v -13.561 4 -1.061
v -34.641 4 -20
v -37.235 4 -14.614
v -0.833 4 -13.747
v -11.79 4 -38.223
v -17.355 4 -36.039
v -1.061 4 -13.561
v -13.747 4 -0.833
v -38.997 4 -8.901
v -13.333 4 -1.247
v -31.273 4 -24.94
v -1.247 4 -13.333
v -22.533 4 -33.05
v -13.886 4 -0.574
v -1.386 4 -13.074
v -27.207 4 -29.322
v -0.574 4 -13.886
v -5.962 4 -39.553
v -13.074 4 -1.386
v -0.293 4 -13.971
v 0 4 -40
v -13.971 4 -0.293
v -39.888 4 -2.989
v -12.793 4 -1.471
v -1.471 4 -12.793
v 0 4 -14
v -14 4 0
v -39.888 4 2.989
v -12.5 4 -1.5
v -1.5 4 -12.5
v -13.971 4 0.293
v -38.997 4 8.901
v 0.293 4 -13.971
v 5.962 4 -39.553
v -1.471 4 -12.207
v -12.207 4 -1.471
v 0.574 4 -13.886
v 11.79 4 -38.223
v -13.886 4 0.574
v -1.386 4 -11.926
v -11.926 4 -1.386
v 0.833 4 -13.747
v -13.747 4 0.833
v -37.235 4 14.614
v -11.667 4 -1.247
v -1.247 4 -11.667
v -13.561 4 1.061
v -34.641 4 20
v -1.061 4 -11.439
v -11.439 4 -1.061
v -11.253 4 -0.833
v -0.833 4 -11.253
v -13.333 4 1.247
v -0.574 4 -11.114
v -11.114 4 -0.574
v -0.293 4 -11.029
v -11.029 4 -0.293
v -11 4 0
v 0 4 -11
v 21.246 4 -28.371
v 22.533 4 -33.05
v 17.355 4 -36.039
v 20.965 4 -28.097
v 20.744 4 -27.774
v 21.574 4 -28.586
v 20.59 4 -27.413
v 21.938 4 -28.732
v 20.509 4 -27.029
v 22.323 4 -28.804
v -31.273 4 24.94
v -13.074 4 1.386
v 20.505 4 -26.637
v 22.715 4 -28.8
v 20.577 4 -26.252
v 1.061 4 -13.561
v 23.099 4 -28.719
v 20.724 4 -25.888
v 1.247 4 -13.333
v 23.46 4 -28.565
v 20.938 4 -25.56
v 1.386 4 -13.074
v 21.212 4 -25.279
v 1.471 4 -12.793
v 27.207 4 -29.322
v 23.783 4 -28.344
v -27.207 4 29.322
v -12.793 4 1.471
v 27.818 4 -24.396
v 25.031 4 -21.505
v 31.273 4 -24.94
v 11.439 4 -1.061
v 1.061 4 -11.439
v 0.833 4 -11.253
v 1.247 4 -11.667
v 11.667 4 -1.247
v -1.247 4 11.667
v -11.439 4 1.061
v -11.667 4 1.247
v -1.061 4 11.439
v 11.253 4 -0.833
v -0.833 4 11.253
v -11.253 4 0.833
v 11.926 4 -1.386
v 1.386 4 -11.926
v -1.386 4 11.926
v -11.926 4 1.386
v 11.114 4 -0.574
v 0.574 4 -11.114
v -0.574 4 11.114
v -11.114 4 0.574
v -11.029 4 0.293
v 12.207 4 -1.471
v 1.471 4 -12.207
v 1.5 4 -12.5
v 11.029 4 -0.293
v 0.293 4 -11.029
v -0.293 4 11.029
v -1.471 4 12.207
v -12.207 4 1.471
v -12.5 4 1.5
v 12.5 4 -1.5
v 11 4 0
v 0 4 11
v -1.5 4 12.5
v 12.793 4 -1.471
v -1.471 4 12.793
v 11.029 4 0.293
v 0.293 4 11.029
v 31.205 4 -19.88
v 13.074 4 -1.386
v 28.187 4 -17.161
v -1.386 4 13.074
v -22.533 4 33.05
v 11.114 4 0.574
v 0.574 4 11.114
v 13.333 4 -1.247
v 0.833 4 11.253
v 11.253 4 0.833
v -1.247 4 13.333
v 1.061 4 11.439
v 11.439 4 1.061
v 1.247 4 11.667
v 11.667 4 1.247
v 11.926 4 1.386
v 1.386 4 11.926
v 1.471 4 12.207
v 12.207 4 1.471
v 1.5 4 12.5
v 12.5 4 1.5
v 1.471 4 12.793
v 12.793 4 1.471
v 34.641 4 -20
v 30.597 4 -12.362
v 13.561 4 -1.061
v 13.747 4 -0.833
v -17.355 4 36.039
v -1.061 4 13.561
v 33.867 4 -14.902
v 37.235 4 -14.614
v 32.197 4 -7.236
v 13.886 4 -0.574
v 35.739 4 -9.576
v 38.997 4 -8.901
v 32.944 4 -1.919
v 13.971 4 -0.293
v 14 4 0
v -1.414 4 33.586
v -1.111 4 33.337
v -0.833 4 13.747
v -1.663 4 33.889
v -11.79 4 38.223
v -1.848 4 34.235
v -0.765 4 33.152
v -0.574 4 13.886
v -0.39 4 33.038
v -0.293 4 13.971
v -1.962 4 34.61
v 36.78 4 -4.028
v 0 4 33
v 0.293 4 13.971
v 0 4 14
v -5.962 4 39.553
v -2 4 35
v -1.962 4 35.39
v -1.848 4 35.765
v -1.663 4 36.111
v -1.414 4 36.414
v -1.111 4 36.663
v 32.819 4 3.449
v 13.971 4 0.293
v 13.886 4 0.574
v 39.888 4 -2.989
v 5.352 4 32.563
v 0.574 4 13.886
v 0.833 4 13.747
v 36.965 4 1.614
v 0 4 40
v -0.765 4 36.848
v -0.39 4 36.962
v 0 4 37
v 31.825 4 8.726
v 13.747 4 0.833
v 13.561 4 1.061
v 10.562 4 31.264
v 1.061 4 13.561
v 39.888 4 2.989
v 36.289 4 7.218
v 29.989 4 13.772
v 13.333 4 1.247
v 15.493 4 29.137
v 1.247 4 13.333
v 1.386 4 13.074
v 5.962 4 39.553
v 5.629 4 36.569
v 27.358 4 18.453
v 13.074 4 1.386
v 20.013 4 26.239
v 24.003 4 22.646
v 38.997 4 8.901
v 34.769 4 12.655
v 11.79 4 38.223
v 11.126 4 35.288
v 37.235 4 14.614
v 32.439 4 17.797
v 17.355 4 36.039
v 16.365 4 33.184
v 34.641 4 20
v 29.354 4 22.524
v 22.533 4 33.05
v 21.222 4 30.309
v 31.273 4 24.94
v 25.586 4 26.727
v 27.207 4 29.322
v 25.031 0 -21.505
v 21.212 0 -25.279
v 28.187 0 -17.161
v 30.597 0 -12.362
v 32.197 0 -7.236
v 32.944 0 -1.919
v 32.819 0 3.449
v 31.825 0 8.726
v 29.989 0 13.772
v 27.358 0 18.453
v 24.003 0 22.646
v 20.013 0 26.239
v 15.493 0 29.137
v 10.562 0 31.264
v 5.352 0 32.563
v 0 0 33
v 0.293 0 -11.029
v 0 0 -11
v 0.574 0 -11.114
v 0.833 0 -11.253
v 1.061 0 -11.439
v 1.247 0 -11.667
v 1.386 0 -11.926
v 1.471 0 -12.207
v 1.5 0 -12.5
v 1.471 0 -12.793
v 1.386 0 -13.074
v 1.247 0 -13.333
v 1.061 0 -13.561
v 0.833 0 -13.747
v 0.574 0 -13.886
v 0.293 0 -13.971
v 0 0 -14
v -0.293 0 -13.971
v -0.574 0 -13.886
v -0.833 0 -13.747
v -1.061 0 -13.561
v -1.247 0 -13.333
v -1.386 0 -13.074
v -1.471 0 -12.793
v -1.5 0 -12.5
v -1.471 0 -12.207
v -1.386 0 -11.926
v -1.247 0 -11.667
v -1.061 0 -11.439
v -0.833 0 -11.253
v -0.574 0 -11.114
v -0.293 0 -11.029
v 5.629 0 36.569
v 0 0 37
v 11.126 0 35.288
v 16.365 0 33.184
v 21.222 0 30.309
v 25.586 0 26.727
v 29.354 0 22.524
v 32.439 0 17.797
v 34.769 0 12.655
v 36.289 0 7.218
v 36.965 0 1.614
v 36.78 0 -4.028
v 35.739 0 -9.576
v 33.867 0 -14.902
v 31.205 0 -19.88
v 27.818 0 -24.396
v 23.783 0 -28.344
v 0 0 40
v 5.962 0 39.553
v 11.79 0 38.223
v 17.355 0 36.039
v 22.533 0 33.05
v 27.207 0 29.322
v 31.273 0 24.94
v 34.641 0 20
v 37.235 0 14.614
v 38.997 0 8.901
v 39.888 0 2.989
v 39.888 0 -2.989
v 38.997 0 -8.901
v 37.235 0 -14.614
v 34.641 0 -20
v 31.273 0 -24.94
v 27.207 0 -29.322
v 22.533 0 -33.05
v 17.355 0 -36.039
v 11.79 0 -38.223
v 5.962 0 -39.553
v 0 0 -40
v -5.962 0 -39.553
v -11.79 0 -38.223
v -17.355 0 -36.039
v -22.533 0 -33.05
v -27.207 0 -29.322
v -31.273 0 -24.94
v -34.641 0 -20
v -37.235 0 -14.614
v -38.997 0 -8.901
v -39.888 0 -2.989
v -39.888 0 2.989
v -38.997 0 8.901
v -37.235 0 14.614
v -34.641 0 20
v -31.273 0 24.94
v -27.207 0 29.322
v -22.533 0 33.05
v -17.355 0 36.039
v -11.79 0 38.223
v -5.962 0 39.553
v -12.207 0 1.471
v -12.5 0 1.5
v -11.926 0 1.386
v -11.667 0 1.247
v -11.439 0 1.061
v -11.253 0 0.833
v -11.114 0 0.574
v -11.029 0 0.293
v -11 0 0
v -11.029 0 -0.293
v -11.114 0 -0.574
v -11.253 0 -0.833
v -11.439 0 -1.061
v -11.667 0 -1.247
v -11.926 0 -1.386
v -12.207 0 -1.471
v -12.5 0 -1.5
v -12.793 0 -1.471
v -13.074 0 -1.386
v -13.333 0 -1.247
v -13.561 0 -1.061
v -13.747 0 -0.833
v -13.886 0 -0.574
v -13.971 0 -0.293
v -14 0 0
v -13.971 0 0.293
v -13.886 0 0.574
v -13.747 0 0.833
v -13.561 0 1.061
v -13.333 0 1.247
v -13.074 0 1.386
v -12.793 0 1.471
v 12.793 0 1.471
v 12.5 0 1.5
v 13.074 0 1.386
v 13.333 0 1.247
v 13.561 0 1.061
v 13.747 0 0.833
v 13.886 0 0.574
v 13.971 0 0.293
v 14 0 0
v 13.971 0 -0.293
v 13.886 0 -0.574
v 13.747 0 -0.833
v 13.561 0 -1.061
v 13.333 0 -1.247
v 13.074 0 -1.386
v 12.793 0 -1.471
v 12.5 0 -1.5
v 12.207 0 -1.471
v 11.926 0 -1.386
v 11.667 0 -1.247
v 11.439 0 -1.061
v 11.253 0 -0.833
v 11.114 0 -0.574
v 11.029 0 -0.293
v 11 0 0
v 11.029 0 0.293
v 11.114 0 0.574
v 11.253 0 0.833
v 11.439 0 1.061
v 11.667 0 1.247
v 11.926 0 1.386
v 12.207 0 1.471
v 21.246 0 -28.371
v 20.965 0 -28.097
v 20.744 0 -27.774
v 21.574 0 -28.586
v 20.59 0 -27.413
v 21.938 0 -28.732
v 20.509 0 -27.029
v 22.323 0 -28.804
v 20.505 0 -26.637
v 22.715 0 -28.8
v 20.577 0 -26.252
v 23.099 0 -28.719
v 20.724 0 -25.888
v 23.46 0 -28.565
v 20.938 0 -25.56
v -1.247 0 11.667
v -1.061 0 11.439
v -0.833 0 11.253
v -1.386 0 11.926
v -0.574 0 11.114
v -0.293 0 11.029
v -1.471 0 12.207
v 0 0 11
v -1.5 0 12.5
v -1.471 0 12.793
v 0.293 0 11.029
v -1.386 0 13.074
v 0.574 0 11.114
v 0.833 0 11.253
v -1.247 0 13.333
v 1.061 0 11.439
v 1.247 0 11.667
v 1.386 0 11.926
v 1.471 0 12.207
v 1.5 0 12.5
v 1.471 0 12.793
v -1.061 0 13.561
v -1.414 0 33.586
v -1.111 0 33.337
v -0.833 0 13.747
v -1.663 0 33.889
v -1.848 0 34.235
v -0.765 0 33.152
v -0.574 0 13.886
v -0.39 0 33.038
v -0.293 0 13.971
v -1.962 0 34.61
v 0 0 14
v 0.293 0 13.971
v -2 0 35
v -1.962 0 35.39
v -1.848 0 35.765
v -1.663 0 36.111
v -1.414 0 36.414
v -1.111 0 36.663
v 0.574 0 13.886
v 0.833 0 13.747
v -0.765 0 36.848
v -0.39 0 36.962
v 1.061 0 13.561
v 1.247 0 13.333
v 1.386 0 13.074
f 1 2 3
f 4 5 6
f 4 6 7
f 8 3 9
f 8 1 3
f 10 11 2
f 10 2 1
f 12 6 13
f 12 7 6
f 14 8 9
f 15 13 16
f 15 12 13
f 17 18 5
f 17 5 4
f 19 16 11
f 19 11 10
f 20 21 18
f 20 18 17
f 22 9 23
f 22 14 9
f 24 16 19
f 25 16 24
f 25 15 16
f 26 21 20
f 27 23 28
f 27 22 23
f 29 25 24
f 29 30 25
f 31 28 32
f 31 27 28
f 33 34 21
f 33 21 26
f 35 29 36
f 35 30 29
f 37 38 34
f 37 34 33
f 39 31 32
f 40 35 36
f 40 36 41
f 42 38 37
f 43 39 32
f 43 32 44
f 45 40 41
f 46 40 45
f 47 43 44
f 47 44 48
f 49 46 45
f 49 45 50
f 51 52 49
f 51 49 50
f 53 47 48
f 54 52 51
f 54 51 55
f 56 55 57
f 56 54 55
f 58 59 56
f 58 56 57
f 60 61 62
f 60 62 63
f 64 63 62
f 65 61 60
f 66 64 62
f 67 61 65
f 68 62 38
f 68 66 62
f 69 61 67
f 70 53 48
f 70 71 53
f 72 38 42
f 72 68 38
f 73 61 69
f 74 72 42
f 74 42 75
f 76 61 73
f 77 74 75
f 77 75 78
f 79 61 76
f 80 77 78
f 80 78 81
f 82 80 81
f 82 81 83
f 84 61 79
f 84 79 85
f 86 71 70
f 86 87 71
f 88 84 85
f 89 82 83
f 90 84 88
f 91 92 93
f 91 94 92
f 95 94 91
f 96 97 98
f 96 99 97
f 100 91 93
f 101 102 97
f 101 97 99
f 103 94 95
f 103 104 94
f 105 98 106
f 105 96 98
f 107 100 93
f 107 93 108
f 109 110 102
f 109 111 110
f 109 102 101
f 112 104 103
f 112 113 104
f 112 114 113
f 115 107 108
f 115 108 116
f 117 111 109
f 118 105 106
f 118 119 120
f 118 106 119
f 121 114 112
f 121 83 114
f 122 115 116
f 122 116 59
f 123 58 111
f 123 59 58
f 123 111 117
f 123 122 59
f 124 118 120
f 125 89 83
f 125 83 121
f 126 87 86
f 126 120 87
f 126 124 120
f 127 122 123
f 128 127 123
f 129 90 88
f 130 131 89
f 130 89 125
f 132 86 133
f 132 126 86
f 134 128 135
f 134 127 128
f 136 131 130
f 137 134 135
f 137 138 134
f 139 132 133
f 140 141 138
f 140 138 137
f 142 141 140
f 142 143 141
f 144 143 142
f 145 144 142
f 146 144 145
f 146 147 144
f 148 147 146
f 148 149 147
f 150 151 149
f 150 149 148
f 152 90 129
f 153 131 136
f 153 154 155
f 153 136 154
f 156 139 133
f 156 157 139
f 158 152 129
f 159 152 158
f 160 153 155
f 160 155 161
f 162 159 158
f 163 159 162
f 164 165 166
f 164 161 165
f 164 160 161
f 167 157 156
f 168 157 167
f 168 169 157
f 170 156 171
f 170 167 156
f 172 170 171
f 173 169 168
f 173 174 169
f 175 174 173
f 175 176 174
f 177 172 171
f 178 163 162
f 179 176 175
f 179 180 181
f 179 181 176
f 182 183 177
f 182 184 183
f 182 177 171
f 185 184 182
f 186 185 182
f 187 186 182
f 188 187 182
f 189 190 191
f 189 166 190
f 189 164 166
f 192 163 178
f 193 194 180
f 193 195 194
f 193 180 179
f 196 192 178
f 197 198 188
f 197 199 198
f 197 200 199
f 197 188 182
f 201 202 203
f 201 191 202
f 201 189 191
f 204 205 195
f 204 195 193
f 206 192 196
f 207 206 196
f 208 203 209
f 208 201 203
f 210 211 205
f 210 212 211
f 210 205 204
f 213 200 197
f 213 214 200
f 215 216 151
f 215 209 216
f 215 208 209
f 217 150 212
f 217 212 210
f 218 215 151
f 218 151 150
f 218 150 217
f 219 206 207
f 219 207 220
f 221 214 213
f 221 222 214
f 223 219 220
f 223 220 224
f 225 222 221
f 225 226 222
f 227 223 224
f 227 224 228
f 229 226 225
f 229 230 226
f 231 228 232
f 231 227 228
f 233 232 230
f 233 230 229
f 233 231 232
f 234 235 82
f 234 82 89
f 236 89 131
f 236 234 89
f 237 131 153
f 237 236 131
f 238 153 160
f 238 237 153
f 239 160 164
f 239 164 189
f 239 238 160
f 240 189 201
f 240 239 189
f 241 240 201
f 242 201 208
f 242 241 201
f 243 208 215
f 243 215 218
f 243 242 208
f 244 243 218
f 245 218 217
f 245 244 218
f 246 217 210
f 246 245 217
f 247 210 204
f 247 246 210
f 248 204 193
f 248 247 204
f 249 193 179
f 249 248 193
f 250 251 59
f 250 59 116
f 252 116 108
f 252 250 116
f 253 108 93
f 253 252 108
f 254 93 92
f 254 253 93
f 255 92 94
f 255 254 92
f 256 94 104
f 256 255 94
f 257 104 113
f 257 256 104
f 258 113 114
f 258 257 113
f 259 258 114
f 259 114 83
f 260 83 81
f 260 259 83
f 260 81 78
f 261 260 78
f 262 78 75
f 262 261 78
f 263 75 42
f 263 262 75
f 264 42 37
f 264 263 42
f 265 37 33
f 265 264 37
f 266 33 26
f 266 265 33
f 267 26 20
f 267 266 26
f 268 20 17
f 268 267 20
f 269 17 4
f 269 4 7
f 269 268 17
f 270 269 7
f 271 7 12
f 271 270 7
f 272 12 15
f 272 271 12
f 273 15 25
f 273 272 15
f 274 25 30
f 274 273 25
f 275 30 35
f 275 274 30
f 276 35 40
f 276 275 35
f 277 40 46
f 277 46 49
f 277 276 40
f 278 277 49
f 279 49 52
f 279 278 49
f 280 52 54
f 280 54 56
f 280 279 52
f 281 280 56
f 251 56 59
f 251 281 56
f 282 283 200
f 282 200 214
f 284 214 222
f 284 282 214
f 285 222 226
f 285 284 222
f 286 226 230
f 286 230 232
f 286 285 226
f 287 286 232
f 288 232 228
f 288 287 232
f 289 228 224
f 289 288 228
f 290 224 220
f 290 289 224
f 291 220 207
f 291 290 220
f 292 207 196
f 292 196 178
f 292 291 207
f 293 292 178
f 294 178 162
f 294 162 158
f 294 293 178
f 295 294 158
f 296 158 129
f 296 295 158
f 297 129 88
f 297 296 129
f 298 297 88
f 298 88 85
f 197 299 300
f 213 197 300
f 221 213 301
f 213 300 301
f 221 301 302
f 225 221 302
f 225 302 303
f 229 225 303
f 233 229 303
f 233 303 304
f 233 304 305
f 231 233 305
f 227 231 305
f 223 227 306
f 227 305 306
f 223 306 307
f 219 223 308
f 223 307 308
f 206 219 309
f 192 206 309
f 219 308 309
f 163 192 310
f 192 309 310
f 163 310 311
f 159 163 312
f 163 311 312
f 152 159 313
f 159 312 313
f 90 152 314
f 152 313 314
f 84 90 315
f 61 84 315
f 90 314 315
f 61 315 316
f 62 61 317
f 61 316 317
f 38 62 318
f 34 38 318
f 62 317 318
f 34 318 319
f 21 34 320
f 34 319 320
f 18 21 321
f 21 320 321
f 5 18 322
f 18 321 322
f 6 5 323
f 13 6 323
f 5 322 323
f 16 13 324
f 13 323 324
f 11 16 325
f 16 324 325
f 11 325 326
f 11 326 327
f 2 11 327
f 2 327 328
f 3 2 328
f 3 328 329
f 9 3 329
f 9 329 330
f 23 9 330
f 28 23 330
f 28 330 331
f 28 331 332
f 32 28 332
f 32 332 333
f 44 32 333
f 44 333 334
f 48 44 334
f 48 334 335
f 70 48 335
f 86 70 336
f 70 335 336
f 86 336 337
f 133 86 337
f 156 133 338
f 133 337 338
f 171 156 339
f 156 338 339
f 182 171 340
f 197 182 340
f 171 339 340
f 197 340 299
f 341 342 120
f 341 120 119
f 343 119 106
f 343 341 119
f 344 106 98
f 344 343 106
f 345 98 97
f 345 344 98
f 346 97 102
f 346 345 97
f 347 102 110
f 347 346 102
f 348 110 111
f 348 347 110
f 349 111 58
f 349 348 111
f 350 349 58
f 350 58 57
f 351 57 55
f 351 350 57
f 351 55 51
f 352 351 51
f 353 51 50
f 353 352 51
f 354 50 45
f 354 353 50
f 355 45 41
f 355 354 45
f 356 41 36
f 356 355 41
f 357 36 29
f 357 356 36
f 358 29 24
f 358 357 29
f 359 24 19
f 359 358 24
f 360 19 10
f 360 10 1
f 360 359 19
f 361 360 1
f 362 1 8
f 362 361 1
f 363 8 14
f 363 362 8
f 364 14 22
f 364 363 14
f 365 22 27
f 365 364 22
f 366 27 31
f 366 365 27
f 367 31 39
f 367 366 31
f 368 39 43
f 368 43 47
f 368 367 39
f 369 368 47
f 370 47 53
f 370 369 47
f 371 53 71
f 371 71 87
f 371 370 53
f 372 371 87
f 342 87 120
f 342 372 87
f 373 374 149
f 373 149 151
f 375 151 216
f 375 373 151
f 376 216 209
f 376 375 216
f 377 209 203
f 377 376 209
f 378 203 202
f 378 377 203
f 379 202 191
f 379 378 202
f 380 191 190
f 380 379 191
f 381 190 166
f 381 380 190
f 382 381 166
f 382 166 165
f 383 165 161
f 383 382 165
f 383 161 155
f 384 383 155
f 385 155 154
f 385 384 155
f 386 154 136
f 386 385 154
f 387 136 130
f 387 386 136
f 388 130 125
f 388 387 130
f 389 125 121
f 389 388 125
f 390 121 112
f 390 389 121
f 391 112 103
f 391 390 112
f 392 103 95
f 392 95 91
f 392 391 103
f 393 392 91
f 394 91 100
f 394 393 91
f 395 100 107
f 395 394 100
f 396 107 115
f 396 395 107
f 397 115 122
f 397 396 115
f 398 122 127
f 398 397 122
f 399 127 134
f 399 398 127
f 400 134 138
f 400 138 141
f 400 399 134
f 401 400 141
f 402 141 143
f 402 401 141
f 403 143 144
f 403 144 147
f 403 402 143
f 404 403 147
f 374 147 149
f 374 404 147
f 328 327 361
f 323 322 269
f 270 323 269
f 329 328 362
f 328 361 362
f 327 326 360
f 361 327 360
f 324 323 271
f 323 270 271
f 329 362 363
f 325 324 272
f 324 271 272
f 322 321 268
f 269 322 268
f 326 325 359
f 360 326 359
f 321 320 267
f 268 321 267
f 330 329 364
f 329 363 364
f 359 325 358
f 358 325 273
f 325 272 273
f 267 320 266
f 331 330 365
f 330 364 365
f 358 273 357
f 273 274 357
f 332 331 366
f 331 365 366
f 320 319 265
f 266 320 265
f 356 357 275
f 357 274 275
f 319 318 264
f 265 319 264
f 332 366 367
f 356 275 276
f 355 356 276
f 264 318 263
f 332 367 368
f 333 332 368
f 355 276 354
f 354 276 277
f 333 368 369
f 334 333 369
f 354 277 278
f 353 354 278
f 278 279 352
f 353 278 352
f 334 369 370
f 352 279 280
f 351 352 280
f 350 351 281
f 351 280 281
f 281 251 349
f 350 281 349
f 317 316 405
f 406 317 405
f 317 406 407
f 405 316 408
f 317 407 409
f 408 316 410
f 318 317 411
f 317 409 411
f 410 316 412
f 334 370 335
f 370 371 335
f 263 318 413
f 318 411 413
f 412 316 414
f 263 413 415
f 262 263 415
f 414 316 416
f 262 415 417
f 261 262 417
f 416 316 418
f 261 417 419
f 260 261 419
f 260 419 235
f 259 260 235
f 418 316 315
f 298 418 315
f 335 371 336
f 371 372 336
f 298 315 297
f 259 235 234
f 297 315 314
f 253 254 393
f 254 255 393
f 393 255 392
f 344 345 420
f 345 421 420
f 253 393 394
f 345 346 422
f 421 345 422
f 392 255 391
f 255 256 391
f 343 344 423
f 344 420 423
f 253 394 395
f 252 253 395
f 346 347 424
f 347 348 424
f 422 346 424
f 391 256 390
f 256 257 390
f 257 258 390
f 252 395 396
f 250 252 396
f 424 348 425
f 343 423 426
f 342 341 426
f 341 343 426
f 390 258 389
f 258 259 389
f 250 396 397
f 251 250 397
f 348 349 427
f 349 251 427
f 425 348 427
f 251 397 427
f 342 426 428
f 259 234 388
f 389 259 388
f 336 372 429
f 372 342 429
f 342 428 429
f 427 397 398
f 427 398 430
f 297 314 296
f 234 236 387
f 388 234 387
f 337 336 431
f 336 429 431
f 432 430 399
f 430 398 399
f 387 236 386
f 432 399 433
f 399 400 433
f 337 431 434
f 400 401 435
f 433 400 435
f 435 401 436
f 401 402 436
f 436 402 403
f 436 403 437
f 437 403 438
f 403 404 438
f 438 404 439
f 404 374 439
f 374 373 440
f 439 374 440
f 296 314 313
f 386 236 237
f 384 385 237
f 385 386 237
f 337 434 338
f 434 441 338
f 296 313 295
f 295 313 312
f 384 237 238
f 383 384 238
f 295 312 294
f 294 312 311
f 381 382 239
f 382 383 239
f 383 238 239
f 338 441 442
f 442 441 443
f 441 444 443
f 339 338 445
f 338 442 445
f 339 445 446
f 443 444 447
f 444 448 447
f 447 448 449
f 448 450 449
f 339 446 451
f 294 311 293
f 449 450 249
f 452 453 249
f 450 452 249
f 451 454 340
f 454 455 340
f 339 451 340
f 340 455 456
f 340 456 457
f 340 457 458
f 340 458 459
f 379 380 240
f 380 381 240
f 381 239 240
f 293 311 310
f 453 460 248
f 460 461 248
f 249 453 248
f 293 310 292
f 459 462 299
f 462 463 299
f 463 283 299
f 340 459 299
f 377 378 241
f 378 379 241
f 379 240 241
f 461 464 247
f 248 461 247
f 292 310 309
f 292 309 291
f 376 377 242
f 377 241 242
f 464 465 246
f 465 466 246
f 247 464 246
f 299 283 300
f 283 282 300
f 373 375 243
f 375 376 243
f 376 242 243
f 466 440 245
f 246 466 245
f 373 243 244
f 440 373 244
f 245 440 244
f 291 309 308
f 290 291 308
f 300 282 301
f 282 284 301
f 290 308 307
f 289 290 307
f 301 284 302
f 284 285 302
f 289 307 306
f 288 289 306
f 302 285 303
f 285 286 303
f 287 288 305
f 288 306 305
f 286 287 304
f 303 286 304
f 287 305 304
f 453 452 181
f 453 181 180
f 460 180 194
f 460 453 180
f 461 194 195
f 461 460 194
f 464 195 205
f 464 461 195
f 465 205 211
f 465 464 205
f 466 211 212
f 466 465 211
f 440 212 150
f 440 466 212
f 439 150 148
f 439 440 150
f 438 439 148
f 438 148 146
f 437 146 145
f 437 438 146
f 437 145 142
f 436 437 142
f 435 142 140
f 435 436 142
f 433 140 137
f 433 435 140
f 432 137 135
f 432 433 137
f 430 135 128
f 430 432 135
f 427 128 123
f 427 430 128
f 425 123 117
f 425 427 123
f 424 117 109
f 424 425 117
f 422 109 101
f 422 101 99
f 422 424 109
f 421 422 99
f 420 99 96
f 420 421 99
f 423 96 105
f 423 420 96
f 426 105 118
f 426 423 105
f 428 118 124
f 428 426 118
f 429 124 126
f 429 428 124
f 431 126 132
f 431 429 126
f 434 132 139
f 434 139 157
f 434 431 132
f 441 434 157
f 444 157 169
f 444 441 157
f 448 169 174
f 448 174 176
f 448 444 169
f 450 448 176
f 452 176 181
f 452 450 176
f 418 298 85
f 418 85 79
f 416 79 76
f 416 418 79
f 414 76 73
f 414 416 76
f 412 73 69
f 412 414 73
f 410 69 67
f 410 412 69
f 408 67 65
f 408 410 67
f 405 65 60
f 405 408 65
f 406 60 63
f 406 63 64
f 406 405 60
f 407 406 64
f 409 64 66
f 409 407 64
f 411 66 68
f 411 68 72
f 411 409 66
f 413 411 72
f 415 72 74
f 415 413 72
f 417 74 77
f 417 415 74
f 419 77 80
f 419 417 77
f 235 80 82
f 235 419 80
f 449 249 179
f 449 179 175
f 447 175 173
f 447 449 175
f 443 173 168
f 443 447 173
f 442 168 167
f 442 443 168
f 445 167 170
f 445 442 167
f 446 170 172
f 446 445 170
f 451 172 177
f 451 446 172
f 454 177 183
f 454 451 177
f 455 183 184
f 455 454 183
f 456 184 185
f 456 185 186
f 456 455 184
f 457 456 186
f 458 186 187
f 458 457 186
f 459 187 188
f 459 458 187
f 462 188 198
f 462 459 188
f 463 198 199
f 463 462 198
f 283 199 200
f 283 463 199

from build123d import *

# Parameters (mm, degrees)
SKETCH1_R           = 40
SKETCH1_R_2         = 1.5
BOSS_EXTRUDE1_DEPTH = 4


with BuildPart() as part:
    # Sketch1 → Boss-Extrude1 (new body)
    with BuildSketch(Plane(origin=(0, 0, 0), x_dir=(1, 0, 0), z_dir=(0, 1, 0))):
        with Locations(Location((0, 0, 0), (0, 0, 270))):
            Circle(SKETCH1_R)
        with Locations(Location((0, -12.5, 0), (0, 0, 270))):
            Circle(SKETCH1_R_2, mode=Mode.SUBTRACT)
        with Locations(Location((-12.5, 0, 0), (0, 0, 270))):
            Circle(SKETCH1_R_2, mode=Mode.SUBTRACT)
        with Locations(Location((0, 12.5, 0), (0, 0, 270))):
            Circle(SKETCH1_R_2, mode=Mode.SUBTRACT)
        with Locations(Location((12.5, 0, 0), (0, 0, 270))):
            Circle(SKETCH1_R_2, mode=Mode.SUBTRACT)
        with BuildLine():
            ThreePointArc((23.783141558, 28.343644395), (20.965477453, 28.097130729), (21.21199112, 25.279466623))
            ThreePointArc((21.21199112, 25.279466623), (31.009856486, -11.28666473), (0, -33))
            ThreePointArc((0, -33), (-2, -35), (0, -37))
            ThreePointArc((0, -37), (34.768626969, -12.654745303), (23.783141558, 28.343644395))
        make_face(mode=Mode.SUBTRACT)
    extrude(amount=BOSS_EXTRUDE1_DEPTH)


solid = part.part
